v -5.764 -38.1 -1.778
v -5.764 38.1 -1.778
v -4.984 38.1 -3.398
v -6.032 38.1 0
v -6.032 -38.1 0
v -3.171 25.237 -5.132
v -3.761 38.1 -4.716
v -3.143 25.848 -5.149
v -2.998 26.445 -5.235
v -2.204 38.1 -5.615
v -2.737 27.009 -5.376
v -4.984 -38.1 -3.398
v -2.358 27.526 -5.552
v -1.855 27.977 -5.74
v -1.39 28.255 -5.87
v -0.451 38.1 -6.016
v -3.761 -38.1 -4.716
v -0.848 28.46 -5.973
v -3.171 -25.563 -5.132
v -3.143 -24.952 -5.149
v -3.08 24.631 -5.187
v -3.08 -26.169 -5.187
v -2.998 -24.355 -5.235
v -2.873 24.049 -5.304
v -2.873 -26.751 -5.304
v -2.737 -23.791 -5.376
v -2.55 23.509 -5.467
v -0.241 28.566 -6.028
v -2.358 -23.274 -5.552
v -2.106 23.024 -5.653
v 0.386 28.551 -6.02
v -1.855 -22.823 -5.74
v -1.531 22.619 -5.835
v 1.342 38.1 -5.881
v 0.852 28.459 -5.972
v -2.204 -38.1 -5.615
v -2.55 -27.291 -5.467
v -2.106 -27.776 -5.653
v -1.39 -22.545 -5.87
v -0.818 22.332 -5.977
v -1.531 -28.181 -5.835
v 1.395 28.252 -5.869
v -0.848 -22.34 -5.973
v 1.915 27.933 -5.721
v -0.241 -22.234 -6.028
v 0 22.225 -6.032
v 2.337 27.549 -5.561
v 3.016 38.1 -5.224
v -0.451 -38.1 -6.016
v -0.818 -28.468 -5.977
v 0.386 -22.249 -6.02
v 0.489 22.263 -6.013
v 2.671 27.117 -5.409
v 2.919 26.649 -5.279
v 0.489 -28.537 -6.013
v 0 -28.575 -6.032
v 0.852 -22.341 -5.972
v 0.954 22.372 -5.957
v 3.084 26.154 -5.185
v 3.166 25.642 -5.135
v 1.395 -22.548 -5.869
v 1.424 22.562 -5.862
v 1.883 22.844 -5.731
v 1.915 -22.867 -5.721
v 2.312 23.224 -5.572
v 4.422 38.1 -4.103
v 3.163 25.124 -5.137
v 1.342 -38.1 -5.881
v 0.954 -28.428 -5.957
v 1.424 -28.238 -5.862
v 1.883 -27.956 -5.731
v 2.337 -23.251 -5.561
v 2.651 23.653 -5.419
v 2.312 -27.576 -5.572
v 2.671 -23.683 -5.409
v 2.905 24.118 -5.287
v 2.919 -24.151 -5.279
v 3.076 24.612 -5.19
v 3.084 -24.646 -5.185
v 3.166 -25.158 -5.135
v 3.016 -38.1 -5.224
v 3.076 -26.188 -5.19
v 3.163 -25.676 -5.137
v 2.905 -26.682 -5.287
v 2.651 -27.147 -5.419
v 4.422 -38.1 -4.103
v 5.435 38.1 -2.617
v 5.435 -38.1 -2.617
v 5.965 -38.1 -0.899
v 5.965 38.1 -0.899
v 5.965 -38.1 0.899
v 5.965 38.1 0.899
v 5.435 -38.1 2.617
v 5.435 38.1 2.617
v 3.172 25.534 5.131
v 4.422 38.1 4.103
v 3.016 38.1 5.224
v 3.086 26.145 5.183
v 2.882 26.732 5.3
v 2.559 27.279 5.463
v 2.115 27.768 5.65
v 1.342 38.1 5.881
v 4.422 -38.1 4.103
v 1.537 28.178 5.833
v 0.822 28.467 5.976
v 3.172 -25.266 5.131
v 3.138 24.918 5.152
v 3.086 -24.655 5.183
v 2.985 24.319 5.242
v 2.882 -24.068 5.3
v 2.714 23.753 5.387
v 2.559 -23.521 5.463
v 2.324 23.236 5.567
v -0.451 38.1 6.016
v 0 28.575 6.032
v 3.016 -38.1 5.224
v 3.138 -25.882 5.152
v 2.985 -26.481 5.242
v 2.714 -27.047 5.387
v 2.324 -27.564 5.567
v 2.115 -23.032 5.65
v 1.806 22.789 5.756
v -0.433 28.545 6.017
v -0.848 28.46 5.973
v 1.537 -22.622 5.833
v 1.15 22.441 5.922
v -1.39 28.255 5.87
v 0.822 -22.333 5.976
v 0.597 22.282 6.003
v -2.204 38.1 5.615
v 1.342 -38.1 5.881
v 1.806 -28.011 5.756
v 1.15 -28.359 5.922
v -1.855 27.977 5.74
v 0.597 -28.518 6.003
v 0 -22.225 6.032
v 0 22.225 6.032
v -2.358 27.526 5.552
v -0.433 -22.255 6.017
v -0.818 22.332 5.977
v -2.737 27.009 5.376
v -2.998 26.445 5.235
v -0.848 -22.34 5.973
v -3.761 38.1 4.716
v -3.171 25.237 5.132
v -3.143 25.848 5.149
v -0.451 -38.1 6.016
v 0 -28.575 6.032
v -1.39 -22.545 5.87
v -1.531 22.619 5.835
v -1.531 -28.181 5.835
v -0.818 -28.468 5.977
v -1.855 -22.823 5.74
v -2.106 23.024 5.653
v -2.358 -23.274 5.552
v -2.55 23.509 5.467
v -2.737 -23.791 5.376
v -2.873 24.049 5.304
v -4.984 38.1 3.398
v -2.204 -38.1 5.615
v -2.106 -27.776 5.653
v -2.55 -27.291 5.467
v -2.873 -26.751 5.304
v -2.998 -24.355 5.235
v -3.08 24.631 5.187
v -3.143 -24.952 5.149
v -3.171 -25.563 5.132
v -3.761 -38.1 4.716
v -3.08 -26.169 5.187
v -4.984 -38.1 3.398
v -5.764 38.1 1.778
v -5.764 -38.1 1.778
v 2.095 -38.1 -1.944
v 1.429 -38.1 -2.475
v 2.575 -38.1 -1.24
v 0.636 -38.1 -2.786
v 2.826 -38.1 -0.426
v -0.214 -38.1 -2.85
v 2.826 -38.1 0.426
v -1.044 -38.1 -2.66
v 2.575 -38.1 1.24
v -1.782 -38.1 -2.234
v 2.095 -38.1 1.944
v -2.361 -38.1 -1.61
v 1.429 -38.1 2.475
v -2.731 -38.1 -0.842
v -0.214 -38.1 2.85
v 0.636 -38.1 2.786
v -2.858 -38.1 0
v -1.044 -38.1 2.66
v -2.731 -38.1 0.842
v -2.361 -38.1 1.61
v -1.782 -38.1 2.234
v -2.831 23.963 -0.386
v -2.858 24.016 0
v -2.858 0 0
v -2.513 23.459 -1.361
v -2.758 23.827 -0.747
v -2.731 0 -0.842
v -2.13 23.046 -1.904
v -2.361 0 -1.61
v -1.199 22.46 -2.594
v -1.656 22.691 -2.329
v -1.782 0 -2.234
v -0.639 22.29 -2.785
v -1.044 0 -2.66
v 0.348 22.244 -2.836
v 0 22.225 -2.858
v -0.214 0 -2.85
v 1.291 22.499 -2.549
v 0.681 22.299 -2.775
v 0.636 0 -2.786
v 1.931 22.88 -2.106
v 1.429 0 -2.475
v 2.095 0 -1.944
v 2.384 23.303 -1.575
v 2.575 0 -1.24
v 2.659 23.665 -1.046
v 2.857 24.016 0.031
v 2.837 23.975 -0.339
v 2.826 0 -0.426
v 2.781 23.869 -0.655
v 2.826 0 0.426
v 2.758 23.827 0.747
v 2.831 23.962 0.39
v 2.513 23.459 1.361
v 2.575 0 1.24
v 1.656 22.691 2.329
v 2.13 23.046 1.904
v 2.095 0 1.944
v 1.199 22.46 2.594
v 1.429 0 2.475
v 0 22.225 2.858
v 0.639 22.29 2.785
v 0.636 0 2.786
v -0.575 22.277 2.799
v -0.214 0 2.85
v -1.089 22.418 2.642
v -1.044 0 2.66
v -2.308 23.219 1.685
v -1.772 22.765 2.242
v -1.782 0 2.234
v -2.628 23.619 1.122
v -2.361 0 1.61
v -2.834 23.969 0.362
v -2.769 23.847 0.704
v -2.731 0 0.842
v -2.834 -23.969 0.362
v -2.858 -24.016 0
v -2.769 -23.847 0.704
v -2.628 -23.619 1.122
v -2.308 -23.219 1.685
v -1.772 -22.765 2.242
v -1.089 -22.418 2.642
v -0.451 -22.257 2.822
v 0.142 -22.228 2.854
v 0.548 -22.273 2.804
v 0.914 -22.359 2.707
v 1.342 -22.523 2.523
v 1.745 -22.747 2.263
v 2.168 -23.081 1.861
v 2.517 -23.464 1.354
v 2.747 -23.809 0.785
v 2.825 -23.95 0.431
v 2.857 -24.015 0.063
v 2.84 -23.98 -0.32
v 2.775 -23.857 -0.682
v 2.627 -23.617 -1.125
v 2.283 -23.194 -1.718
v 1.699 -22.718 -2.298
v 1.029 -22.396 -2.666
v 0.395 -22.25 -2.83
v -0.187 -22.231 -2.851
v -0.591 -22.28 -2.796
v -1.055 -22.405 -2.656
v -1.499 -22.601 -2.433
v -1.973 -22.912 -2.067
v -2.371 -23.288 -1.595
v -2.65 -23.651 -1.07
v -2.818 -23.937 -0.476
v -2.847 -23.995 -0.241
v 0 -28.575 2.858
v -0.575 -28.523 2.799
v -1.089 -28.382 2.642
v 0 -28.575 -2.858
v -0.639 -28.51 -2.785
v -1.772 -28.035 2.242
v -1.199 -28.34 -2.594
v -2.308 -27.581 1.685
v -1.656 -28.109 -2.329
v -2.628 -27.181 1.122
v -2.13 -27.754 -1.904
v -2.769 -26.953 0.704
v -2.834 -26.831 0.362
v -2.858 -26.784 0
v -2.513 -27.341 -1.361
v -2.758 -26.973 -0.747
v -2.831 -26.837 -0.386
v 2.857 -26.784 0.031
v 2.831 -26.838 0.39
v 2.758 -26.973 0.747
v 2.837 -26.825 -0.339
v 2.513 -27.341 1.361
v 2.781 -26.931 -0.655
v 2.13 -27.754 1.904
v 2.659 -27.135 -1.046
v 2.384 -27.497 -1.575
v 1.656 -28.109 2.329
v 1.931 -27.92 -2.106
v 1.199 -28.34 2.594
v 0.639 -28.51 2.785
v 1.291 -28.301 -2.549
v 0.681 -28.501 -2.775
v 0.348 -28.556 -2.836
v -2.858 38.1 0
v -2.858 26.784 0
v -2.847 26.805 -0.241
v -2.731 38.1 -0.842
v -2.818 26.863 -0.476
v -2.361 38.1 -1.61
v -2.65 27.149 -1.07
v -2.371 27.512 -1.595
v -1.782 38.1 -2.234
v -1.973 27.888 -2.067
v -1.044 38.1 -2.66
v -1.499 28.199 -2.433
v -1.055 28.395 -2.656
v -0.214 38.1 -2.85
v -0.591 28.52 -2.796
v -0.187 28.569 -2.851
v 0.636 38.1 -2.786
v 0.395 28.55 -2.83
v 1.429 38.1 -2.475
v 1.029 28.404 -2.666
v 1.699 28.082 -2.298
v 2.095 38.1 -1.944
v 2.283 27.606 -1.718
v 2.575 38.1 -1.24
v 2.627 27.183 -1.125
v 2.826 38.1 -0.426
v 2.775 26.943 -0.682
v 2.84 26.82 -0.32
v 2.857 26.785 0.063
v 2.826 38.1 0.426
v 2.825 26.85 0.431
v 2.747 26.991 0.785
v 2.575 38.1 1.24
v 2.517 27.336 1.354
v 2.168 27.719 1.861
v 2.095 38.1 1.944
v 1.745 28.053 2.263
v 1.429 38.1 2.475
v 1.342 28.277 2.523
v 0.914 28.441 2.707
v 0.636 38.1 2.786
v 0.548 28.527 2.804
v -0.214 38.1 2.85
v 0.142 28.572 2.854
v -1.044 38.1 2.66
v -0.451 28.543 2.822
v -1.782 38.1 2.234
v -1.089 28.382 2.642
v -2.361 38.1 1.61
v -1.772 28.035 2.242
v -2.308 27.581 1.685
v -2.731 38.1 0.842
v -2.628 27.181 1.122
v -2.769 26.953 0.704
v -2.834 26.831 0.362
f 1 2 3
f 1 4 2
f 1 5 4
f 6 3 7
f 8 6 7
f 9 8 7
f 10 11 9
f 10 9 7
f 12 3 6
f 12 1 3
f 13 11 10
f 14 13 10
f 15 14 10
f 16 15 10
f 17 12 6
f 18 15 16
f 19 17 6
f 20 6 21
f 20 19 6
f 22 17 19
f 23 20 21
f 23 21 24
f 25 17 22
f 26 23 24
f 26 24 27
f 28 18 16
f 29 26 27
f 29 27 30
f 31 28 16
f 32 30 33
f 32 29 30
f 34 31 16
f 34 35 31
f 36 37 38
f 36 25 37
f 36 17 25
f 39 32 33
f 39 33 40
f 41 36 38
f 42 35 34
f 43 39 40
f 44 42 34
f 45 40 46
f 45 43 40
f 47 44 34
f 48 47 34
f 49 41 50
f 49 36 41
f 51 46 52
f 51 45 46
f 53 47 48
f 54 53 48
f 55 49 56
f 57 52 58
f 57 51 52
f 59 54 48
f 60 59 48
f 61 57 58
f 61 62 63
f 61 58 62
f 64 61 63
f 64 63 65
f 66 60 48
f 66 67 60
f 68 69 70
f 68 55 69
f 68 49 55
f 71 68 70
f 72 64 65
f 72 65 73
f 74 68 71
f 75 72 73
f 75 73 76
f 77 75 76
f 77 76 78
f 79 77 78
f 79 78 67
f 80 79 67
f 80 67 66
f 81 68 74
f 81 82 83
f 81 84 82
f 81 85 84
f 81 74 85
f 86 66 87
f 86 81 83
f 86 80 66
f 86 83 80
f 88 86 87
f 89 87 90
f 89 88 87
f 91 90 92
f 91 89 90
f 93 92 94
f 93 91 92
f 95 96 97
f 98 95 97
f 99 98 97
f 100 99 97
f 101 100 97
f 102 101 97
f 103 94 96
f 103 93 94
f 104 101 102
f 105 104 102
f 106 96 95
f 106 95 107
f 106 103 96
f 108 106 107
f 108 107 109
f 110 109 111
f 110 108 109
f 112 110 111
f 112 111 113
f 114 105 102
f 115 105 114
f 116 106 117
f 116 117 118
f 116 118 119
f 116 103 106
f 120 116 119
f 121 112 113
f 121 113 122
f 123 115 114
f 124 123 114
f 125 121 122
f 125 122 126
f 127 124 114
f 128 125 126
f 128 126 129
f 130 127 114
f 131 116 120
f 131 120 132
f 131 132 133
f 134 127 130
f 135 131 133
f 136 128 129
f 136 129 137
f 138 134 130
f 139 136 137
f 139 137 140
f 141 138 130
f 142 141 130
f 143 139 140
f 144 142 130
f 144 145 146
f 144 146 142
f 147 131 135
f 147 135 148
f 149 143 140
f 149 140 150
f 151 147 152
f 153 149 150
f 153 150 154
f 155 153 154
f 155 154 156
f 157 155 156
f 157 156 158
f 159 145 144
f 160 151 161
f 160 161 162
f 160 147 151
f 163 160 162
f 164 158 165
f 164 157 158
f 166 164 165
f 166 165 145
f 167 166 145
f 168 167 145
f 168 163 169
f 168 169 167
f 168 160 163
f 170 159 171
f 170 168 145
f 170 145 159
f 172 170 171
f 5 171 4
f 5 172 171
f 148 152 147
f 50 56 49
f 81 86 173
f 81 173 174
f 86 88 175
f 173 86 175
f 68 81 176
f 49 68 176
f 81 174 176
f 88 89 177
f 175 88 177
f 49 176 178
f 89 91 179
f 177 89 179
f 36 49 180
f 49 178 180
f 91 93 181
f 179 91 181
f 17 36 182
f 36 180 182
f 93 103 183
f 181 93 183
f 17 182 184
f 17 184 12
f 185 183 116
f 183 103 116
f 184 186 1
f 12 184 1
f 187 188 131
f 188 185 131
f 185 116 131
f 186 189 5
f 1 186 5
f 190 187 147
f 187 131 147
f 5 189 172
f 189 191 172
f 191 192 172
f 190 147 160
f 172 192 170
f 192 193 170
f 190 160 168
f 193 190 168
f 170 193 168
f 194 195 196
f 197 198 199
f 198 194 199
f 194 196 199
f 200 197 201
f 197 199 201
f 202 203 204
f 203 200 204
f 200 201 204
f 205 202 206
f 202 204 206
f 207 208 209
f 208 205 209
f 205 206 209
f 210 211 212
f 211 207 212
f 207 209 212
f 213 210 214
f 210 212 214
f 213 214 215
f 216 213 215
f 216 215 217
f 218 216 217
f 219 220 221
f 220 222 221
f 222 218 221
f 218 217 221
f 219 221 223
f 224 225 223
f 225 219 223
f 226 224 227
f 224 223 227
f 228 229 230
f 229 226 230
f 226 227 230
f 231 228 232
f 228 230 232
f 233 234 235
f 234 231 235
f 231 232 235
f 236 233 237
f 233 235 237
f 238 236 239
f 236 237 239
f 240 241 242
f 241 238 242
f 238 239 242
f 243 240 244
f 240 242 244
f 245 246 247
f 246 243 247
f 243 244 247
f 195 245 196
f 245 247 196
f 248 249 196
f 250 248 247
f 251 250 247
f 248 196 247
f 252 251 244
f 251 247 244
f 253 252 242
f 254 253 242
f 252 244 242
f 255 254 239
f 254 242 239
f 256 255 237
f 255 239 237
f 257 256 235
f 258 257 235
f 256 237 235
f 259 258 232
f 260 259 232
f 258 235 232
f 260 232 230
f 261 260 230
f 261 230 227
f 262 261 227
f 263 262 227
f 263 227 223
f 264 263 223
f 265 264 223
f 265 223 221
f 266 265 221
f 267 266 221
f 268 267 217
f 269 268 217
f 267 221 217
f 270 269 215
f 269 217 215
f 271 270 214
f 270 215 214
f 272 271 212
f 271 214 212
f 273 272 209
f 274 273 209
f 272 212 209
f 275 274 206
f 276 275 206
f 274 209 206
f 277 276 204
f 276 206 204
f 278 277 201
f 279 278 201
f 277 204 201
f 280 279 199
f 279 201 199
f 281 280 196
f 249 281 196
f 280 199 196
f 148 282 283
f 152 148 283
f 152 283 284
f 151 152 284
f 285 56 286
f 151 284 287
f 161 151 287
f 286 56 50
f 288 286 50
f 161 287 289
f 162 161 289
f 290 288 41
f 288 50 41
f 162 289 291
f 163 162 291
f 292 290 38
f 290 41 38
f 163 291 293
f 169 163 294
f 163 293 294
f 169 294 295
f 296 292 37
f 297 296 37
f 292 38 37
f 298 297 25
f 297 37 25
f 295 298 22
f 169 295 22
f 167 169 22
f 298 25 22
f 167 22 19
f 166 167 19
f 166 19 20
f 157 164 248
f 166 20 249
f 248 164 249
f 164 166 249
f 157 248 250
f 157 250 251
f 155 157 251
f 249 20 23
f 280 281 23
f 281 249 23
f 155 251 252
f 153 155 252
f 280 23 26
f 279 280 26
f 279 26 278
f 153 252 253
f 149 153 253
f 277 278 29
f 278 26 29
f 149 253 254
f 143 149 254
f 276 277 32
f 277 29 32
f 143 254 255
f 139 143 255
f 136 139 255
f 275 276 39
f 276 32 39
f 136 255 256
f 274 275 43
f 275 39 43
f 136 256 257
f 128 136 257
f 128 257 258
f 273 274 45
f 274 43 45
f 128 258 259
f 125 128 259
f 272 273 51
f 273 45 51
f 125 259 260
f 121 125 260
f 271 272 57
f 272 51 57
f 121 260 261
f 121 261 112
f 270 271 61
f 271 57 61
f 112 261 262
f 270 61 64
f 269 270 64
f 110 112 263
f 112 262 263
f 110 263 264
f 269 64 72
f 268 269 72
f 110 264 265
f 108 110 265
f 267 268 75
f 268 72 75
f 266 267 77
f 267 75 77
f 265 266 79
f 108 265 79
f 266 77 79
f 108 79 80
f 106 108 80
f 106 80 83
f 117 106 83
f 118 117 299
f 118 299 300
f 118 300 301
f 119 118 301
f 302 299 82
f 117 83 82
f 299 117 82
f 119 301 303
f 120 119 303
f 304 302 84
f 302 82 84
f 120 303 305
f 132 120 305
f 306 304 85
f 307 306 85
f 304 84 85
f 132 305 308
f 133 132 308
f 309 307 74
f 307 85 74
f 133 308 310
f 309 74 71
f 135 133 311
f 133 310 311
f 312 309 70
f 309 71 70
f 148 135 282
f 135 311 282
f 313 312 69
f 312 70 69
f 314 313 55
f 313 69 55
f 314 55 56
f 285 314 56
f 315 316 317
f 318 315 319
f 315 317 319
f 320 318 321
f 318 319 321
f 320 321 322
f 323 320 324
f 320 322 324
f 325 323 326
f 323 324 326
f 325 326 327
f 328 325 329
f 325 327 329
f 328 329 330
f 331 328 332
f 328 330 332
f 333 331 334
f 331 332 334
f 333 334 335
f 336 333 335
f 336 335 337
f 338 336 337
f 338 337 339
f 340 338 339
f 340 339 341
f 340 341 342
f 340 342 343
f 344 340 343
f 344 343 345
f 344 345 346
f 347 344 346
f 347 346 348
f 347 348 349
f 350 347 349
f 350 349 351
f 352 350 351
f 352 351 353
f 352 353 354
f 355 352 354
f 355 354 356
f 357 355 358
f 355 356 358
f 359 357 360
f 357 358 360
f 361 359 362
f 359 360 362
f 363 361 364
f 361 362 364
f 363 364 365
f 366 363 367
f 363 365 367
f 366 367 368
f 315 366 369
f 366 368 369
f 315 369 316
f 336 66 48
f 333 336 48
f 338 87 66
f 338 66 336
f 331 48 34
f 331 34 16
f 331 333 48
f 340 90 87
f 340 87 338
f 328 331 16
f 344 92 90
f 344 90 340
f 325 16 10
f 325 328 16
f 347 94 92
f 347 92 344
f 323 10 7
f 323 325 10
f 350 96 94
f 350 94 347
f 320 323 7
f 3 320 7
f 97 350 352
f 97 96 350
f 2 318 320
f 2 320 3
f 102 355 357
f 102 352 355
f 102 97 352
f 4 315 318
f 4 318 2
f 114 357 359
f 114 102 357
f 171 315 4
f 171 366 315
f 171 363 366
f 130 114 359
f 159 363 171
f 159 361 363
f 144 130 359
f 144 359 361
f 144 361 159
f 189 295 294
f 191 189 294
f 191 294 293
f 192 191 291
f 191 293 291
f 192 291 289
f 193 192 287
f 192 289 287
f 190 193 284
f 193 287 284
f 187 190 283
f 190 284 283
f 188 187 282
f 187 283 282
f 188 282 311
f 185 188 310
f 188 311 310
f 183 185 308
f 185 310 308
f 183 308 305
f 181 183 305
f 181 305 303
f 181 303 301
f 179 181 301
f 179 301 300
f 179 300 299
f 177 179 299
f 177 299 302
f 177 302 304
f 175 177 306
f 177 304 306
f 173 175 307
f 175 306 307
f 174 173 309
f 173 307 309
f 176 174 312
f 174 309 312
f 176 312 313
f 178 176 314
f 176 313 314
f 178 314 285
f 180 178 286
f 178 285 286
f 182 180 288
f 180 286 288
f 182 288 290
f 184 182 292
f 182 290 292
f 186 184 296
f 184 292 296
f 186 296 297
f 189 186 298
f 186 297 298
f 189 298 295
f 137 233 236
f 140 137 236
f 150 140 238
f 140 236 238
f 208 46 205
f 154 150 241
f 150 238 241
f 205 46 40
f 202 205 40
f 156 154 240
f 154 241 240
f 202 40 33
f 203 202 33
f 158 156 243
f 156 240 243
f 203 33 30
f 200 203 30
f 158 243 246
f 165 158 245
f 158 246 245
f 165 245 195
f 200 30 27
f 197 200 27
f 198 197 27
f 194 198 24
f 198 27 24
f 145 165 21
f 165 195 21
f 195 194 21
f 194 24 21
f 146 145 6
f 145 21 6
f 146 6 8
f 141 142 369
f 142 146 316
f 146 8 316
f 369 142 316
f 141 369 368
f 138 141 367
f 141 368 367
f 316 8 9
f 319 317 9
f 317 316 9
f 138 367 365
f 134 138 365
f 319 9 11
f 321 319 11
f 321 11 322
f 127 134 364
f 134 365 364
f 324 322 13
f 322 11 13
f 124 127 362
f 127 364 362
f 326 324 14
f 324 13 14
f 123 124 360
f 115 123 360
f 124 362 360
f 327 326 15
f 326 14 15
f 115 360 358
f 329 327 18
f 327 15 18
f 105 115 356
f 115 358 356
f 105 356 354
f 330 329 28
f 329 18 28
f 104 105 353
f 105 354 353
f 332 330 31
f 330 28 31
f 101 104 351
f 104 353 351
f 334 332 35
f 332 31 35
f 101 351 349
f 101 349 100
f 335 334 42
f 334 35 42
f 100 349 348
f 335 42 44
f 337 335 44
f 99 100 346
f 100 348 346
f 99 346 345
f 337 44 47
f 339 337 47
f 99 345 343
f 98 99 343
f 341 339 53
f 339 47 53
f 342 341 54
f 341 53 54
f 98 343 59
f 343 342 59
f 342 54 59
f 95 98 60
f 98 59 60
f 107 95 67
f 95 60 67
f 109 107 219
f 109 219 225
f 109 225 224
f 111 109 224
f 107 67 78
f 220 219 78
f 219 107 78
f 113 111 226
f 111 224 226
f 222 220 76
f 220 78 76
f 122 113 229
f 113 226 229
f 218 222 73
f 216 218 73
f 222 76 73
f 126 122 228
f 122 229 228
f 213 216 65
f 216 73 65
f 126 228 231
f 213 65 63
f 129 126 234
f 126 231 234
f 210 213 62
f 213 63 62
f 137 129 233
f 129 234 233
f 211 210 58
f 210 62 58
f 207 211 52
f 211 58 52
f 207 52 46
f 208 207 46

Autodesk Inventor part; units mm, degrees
ref_plane "YZ Plane" through (0, 0, 0) normal (1, 0, 0) x (0, 1, 0)
ref_plane "XZ Plane" through (0, 0, 0) normal (0, 1, 0) x (-1, 0, 0)
sketch "Sketch1" plane through (0, 0, 0) normal (0, 1, 0) x (-1, 0, 0)
  circle A0 centre (0, 0) radius 6.0325
  circle A1 centre (0, 0) radius 2.8575
  dimension "d0" = 12.065
  dimension "d1" = 5.715
extrude "Extrusion1" add sketch "Sketch1" along normal mid plane 76.2
ref_plane "Work Plane1" through (0, 0, 6.0325) normal (0, 0, 1) x (1, 0, 0)
sketch "Sketch2" plane through (0, 0, 6.0325) normal (0, 0, 1) x (1, 0, 0)
  line L0 (6.0325, 38.1) -> (-6.0325, 38.1) projected
  line L1 (-6.0325, -38.1) -> (6.0325, -38.1) projected
  point P0 (0, 0)
  point P1 (0, 25.4)
  point P2 (0, -25.4)
  dimension "d4" = 12.7
  dimension "d5" = 12.7
hole "Hole1" at (0, 25.4, 6.0325) at (0, -25.4, 6.0325) direction (0, 0, -1) diameter 6.35 end through all
properties part number "ConnectorRod"
